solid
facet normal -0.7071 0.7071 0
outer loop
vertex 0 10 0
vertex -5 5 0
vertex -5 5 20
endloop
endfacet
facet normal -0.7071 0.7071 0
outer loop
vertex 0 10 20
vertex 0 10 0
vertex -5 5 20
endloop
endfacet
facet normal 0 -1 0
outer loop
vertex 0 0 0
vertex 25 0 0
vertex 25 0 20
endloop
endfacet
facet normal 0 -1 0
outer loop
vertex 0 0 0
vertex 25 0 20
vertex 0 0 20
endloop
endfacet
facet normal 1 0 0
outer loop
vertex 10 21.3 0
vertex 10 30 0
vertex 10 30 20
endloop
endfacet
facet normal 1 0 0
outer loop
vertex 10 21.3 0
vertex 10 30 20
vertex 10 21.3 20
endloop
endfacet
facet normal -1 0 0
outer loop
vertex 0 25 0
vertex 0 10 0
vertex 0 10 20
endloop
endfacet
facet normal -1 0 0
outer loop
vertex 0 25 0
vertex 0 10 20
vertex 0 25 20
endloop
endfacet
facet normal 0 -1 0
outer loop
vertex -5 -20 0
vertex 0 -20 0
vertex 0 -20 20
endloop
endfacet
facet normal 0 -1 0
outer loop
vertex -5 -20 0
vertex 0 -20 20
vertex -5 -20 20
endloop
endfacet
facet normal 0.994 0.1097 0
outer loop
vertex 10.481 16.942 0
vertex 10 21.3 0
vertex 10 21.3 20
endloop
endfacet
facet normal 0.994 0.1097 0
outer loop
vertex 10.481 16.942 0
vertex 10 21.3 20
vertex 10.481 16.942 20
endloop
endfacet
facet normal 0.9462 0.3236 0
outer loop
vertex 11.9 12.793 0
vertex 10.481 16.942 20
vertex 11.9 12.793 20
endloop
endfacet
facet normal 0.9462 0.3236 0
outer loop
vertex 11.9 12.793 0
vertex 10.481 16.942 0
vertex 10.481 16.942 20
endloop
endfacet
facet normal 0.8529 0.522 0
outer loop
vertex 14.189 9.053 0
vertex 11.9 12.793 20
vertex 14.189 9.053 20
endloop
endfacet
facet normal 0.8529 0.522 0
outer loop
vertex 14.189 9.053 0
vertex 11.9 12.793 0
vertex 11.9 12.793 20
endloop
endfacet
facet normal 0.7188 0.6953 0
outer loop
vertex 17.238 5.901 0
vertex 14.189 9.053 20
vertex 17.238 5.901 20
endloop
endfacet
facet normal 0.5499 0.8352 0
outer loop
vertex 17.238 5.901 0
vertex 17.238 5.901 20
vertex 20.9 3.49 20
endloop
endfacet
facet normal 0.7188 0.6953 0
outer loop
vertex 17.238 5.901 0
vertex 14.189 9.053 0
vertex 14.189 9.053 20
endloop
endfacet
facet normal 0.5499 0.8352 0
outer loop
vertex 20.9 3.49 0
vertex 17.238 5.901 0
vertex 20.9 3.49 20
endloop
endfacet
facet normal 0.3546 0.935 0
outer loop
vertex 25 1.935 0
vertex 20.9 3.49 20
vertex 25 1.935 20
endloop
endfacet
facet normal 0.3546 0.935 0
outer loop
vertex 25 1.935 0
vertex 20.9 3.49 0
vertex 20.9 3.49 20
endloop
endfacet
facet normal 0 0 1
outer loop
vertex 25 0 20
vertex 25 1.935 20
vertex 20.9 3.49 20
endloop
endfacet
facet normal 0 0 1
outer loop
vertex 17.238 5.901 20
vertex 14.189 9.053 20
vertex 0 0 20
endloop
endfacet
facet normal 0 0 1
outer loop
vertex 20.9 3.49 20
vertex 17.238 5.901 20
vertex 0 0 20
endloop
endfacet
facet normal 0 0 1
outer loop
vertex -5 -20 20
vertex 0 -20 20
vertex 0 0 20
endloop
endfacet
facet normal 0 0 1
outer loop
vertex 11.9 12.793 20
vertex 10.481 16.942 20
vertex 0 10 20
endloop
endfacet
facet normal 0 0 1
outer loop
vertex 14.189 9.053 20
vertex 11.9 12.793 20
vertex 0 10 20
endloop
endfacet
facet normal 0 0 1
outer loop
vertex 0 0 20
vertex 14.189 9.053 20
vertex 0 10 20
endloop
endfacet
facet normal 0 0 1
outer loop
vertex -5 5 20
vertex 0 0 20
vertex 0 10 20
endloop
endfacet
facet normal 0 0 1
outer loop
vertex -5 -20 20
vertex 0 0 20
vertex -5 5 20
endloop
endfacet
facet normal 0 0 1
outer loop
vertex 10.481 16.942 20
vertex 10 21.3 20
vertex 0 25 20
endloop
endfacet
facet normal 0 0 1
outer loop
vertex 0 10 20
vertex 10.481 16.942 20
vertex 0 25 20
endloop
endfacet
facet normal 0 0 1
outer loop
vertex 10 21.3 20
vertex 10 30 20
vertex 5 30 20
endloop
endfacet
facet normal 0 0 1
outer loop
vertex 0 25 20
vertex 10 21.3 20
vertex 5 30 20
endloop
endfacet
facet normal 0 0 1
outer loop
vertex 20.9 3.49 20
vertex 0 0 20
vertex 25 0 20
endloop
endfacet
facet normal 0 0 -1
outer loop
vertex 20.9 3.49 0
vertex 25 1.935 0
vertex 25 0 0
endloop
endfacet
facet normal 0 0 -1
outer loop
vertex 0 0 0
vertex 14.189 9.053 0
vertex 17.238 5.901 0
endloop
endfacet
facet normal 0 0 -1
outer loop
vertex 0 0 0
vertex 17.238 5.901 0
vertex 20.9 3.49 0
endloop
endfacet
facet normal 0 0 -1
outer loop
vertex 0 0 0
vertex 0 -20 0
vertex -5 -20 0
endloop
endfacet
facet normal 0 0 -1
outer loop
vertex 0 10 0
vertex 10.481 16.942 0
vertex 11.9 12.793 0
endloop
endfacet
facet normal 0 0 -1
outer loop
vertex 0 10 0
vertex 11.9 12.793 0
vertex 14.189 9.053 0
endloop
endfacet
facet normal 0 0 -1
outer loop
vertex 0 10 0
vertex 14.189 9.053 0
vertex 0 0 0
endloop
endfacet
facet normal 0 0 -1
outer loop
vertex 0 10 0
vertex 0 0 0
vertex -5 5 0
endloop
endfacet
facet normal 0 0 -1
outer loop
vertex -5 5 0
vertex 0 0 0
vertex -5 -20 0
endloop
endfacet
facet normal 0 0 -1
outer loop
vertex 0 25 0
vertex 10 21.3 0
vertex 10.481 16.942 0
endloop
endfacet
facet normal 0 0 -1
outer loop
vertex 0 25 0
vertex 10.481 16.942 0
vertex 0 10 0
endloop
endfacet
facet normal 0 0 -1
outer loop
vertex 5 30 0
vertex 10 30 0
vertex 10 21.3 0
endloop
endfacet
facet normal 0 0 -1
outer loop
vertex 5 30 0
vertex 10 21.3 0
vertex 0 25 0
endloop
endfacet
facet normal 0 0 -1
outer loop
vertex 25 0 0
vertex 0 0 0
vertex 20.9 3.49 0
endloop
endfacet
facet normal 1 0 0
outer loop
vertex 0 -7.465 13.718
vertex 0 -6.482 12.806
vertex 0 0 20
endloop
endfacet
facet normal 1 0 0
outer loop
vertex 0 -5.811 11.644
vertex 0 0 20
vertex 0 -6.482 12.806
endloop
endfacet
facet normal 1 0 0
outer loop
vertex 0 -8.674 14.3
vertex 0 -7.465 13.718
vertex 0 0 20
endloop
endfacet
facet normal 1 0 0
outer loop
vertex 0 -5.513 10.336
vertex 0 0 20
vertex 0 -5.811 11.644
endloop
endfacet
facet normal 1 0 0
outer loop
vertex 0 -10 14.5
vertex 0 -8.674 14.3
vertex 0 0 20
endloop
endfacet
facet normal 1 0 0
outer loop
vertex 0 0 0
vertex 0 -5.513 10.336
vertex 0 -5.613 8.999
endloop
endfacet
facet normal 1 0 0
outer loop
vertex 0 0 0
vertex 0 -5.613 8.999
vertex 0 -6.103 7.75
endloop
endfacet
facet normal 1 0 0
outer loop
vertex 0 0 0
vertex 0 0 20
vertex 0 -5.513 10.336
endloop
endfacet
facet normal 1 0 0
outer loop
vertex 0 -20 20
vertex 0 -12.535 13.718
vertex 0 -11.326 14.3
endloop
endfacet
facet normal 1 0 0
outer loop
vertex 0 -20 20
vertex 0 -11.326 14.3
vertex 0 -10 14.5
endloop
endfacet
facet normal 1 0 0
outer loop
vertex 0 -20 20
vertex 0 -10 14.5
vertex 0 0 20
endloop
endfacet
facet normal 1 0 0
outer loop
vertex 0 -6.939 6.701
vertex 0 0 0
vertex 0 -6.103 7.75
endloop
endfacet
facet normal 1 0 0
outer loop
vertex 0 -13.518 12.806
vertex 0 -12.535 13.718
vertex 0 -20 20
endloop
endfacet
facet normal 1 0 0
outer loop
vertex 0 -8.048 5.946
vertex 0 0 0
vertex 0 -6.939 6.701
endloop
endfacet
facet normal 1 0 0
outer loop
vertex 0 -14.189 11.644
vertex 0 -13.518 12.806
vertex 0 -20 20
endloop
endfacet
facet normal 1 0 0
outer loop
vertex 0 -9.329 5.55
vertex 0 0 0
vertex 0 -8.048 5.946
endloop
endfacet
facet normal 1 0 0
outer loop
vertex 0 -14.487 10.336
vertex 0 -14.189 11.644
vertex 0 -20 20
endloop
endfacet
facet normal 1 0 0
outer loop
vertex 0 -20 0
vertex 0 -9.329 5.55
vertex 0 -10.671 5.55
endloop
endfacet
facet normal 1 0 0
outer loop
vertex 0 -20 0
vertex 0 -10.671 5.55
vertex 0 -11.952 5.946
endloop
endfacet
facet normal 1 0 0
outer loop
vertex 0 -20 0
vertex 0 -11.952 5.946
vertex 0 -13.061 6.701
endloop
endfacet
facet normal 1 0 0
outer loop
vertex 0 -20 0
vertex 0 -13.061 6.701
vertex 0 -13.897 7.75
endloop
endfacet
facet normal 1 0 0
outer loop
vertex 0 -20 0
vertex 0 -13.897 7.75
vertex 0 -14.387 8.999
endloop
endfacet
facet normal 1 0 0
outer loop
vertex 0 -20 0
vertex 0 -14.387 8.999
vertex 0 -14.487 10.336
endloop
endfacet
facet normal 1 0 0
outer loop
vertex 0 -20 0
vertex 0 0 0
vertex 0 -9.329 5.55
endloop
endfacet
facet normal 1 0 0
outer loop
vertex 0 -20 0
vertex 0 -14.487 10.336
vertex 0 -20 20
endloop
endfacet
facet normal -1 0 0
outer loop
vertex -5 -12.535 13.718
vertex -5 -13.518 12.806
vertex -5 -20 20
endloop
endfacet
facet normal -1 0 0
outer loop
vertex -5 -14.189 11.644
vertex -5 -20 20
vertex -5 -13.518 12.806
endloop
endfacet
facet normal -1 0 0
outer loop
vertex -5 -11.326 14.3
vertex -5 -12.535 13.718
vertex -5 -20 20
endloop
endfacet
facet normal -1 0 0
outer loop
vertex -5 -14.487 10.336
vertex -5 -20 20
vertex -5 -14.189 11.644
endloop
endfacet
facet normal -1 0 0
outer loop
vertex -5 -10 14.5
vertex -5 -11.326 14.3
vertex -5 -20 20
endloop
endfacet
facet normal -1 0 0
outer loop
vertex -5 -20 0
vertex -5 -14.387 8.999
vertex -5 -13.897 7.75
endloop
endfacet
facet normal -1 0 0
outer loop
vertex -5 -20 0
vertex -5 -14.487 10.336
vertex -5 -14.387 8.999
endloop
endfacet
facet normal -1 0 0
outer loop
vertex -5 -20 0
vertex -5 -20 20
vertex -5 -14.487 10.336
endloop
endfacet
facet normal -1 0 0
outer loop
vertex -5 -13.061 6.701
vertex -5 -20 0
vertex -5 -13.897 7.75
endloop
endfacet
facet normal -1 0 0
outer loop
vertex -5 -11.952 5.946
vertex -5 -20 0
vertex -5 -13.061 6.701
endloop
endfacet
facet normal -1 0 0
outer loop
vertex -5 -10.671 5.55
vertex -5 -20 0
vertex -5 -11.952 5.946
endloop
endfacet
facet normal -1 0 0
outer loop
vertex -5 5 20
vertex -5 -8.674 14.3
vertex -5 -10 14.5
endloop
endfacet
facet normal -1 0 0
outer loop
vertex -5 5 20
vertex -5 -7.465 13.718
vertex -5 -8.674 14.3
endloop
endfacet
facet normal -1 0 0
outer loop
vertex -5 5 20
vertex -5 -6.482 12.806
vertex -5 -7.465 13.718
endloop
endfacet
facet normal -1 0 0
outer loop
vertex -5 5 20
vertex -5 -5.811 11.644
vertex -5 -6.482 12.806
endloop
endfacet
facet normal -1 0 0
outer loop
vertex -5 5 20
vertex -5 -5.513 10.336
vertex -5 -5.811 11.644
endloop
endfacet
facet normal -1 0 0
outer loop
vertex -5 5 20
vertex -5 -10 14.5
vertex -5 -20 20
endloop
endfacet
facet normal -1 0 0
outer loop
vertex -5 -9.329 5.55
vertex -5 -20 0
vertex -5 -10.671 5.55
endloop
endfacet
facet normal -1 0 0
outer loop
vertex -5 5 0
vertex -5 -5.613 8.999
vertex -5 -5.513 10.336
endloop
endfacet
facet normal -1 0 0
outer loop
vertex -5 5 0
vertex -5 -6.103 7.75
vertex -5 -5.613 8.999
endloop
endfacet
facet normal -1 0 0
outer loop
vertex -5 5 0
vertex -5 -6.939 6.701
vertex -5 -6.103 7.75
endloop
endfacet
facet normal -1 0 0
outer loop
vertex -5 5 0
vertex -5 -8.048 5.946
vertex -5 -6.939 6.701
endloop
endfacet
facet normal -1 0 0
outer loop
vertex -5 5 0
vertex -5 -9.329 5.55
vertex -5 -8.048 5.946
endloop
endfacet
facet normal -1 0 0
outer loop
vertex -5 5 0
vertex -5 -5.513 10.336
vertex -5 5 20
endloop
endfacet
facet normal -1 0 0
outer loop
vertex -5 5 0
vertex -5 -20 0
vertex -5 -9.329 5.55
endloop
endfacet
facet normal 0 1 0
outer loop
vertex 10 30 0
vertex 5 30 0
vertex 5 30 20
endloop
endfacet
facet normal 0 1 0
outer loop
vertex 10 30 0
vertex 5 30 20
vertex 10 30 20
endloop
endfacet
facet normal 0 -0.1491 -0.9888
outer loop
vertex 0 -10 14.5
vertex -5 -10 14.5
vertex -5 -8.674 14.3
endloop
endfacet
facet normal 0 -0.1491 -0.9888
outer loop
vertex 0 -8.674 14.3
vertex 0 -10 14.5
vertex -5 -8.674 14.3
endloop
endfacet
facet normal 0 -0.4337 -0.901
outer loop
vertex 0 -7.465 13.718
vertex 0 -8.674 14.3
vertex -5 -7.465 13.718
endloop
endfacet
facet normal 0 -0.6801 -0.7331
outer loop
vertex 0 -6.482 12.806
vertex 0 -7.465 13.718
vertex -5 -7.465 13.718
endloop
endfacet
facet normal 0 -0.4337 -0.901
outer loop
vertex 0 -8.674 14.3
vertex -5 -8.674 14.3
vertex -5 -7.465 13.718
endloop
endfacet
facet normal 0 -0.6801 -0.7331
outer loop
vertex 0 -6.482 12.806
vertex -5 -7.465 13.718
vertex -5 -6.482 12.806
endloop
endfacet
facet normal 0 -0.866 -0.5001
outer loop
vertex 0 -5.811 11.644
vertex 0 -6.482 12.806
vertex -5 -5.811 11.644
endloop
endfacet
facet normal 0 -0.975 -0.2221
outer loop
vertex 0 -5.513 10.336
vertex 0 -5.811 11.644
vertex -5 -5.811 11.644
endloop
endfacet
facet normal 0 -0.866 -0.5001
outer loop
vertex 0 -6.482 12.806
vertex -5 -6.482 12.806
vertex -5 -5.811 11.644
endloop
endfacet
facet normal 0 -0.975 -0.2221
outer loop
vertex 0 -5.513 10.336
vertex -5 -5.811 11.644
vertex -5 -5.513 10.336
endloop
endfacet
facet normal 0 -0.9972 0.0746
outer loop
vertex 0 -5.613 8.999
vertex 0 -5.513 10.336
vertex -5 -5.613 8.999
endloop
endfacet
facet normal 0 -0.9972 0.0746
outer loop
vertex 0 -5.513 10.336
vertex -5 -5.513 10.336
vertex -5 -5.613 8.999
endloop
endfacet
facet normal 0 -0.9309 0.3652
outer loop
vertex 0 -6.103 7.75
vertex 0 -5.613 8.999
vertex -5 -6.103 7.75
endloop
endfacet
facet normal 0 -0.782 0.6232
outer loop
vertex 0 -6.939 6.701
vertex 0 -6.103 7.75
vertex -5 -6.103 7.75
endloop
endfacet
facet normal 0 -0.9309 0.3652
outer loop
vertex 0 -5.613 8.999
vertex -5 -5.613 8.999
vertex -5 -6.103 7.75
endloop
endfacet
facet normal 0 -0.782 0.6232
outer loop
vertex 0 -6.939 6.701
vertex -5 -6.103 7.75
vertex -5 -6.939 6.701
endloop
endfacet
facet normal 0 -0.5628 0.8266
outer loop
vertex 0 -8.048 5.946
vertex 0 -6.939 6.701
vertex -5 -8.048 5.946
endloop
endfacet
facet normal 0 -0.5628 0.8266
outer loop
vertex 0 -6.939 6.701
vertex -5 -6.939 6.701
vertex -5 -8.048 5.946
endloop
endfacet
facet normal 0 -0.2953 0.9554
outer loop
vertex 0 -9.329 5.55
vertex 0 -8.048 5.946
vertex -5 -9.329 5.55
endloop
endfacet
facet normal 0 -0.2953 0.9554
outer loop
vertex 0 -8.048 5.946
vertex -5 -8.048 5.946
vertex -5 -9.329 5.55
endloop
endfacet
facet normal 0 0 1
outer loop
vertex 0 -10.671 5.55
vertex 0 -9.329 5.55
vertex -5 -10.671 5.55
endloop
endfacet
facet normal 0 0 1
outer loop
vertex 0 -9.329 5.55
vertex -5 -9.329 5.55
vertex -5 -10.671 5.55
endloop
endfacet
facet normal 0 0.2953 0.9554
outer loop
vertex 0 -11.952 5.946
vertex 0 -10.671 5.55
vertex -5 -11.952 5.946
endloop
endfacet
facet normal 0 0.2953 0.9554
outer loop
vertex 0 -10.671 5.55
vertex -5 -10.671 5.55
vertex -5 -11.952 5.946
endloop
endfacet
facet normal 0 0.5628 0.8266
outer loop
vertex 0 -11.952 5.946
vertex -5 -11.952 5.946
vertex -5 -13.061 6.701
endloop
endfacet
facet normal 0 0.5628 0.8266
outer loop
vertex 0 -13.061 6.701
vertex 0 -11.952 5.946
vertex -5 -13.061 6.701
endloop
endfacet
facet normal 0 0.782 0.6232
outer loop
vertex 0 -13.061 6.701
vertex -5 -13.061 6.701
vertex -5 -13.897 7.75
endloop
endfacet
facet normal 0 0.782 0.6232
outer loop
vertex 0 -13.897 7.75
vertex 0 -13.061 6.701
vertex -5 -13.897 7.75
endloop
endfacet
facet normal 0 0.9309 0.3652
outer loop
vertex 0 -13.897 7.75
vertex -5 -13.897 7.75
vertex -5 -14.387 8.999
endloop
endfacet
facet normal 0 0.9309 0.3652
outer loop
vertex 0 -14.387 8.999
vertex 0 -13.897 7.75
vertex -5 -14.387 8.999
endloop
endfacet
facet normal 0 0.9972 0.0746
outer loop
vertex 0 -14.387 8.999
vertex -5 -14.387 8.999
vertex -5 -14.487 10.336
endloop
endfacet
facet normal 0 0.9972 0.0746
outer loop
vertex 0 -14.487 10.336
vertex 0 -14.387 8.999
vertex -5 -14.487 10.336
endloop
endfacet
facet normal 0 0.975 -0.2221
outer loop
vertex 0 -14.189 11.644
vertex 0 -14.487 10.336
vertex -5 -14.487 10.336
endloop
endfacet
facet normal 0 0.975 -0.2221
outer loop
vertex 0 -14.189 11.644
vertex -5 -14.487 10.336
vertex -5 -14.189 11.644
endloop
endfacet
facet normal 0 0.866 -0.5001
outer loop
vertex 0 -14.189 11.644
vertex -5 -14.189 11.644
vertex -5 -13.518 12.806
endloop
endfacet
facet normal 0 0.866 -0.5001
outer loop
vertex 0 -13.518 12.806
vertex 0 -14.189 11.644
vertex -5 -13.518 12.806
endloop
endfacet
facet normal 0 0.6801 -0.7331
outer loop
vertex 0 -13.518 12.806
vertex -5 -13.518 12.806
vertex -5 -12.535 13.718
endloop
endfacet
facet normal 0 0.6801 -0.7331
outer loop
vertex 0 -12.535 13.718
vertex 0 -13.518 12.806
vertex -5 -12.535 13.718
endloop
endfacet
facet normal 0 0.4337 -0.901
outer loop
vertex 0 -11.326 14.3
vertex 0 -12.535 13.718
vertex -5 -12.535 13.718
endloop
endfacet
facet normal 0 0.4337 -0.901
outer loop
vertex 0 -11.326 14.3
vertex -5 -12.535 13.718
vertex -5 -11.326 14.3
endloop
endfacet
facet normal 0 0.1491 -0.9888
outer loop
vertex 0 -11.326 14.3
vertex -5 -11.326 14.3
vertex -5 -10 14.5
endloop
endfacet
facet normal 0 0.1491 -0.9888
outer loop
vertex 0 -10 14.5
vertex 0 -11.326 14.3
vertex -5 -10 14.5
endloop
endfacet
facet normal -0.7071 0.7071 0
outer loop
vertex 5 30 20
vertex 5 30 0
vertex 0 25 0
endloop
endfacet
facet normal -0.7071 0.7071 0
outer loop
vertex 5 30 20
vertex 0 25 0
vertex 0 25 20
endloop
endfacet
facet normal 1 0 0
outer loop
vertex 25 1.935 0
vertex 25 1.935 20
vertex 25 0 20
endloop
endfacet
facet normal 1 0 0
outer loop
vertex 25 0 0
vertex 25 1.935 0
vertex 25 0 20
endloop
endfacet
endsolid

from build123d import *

# Parameters (mm, degrees)
EXTRUDE_1_DEPTH     = 20
SKETCH_3_R          = 4.5
CUT_EXTRUDE_2_DEPTH = 20
CHAMFER_1_SIZE      = 5
CHAMFER_2_SIZE      = 5


with BuildPart() as part:
    # 草图1 → 凸台-拉伸1 (new body)
    with BuildSketch(Plane.XY):
        with BuildLine():
            Line((0, 5), (0, 30))
            Line((0, 30), (10, 30))
            Line((10, 30), (10, 21.3))
            ThreePointArc((10, 21.3), (14.188611699, 9.052551286), (25, 1.935083269))
            Line((25, 1.935083269), (25, 0))
            Line((25, 0), (6.25, 0))
            Line((6.25, 0), (0, 0))
            Line((0, 0), (0, -20))
            Line((0, -20), (-5, -20))
            Line((-5, -20), (-5, 5))
            Line((-5, 5), (0, 5))
        make_face()
    extrude(amount=EXTRUDE_1_DEPTH)

    # 草图3 → 切除-拉伸2 (cut)
    with BuildSketch(Plane.ZY.offset(5)):
        with Locations((10, -10)):
            Circle(SKETCH_3_R)
    extrude(amount=-CUT_EXTRUDE_2_DEPTH, mode=Mode.SUBTRACT)

    # 倒角1
    chamfer_1_edges = [part.edges().sort_by_distance(p)[0] for p in [
        (0, 5, 10),
    ]]
    chamfer(chamfer_1_edges, length=CHAMFER_1_SIZE - 0.0001)  # a hair under: the kernel refuses the full size

    # 倒角2
    chamfer_2_edges = [part.edges().sort_by_distance(p)[0] for p in [
        (0, 30, 10),
    ]]
    chamfer(chamfer_2_edges, length=CHAMFER_2_SIZE)


solid = part.part
